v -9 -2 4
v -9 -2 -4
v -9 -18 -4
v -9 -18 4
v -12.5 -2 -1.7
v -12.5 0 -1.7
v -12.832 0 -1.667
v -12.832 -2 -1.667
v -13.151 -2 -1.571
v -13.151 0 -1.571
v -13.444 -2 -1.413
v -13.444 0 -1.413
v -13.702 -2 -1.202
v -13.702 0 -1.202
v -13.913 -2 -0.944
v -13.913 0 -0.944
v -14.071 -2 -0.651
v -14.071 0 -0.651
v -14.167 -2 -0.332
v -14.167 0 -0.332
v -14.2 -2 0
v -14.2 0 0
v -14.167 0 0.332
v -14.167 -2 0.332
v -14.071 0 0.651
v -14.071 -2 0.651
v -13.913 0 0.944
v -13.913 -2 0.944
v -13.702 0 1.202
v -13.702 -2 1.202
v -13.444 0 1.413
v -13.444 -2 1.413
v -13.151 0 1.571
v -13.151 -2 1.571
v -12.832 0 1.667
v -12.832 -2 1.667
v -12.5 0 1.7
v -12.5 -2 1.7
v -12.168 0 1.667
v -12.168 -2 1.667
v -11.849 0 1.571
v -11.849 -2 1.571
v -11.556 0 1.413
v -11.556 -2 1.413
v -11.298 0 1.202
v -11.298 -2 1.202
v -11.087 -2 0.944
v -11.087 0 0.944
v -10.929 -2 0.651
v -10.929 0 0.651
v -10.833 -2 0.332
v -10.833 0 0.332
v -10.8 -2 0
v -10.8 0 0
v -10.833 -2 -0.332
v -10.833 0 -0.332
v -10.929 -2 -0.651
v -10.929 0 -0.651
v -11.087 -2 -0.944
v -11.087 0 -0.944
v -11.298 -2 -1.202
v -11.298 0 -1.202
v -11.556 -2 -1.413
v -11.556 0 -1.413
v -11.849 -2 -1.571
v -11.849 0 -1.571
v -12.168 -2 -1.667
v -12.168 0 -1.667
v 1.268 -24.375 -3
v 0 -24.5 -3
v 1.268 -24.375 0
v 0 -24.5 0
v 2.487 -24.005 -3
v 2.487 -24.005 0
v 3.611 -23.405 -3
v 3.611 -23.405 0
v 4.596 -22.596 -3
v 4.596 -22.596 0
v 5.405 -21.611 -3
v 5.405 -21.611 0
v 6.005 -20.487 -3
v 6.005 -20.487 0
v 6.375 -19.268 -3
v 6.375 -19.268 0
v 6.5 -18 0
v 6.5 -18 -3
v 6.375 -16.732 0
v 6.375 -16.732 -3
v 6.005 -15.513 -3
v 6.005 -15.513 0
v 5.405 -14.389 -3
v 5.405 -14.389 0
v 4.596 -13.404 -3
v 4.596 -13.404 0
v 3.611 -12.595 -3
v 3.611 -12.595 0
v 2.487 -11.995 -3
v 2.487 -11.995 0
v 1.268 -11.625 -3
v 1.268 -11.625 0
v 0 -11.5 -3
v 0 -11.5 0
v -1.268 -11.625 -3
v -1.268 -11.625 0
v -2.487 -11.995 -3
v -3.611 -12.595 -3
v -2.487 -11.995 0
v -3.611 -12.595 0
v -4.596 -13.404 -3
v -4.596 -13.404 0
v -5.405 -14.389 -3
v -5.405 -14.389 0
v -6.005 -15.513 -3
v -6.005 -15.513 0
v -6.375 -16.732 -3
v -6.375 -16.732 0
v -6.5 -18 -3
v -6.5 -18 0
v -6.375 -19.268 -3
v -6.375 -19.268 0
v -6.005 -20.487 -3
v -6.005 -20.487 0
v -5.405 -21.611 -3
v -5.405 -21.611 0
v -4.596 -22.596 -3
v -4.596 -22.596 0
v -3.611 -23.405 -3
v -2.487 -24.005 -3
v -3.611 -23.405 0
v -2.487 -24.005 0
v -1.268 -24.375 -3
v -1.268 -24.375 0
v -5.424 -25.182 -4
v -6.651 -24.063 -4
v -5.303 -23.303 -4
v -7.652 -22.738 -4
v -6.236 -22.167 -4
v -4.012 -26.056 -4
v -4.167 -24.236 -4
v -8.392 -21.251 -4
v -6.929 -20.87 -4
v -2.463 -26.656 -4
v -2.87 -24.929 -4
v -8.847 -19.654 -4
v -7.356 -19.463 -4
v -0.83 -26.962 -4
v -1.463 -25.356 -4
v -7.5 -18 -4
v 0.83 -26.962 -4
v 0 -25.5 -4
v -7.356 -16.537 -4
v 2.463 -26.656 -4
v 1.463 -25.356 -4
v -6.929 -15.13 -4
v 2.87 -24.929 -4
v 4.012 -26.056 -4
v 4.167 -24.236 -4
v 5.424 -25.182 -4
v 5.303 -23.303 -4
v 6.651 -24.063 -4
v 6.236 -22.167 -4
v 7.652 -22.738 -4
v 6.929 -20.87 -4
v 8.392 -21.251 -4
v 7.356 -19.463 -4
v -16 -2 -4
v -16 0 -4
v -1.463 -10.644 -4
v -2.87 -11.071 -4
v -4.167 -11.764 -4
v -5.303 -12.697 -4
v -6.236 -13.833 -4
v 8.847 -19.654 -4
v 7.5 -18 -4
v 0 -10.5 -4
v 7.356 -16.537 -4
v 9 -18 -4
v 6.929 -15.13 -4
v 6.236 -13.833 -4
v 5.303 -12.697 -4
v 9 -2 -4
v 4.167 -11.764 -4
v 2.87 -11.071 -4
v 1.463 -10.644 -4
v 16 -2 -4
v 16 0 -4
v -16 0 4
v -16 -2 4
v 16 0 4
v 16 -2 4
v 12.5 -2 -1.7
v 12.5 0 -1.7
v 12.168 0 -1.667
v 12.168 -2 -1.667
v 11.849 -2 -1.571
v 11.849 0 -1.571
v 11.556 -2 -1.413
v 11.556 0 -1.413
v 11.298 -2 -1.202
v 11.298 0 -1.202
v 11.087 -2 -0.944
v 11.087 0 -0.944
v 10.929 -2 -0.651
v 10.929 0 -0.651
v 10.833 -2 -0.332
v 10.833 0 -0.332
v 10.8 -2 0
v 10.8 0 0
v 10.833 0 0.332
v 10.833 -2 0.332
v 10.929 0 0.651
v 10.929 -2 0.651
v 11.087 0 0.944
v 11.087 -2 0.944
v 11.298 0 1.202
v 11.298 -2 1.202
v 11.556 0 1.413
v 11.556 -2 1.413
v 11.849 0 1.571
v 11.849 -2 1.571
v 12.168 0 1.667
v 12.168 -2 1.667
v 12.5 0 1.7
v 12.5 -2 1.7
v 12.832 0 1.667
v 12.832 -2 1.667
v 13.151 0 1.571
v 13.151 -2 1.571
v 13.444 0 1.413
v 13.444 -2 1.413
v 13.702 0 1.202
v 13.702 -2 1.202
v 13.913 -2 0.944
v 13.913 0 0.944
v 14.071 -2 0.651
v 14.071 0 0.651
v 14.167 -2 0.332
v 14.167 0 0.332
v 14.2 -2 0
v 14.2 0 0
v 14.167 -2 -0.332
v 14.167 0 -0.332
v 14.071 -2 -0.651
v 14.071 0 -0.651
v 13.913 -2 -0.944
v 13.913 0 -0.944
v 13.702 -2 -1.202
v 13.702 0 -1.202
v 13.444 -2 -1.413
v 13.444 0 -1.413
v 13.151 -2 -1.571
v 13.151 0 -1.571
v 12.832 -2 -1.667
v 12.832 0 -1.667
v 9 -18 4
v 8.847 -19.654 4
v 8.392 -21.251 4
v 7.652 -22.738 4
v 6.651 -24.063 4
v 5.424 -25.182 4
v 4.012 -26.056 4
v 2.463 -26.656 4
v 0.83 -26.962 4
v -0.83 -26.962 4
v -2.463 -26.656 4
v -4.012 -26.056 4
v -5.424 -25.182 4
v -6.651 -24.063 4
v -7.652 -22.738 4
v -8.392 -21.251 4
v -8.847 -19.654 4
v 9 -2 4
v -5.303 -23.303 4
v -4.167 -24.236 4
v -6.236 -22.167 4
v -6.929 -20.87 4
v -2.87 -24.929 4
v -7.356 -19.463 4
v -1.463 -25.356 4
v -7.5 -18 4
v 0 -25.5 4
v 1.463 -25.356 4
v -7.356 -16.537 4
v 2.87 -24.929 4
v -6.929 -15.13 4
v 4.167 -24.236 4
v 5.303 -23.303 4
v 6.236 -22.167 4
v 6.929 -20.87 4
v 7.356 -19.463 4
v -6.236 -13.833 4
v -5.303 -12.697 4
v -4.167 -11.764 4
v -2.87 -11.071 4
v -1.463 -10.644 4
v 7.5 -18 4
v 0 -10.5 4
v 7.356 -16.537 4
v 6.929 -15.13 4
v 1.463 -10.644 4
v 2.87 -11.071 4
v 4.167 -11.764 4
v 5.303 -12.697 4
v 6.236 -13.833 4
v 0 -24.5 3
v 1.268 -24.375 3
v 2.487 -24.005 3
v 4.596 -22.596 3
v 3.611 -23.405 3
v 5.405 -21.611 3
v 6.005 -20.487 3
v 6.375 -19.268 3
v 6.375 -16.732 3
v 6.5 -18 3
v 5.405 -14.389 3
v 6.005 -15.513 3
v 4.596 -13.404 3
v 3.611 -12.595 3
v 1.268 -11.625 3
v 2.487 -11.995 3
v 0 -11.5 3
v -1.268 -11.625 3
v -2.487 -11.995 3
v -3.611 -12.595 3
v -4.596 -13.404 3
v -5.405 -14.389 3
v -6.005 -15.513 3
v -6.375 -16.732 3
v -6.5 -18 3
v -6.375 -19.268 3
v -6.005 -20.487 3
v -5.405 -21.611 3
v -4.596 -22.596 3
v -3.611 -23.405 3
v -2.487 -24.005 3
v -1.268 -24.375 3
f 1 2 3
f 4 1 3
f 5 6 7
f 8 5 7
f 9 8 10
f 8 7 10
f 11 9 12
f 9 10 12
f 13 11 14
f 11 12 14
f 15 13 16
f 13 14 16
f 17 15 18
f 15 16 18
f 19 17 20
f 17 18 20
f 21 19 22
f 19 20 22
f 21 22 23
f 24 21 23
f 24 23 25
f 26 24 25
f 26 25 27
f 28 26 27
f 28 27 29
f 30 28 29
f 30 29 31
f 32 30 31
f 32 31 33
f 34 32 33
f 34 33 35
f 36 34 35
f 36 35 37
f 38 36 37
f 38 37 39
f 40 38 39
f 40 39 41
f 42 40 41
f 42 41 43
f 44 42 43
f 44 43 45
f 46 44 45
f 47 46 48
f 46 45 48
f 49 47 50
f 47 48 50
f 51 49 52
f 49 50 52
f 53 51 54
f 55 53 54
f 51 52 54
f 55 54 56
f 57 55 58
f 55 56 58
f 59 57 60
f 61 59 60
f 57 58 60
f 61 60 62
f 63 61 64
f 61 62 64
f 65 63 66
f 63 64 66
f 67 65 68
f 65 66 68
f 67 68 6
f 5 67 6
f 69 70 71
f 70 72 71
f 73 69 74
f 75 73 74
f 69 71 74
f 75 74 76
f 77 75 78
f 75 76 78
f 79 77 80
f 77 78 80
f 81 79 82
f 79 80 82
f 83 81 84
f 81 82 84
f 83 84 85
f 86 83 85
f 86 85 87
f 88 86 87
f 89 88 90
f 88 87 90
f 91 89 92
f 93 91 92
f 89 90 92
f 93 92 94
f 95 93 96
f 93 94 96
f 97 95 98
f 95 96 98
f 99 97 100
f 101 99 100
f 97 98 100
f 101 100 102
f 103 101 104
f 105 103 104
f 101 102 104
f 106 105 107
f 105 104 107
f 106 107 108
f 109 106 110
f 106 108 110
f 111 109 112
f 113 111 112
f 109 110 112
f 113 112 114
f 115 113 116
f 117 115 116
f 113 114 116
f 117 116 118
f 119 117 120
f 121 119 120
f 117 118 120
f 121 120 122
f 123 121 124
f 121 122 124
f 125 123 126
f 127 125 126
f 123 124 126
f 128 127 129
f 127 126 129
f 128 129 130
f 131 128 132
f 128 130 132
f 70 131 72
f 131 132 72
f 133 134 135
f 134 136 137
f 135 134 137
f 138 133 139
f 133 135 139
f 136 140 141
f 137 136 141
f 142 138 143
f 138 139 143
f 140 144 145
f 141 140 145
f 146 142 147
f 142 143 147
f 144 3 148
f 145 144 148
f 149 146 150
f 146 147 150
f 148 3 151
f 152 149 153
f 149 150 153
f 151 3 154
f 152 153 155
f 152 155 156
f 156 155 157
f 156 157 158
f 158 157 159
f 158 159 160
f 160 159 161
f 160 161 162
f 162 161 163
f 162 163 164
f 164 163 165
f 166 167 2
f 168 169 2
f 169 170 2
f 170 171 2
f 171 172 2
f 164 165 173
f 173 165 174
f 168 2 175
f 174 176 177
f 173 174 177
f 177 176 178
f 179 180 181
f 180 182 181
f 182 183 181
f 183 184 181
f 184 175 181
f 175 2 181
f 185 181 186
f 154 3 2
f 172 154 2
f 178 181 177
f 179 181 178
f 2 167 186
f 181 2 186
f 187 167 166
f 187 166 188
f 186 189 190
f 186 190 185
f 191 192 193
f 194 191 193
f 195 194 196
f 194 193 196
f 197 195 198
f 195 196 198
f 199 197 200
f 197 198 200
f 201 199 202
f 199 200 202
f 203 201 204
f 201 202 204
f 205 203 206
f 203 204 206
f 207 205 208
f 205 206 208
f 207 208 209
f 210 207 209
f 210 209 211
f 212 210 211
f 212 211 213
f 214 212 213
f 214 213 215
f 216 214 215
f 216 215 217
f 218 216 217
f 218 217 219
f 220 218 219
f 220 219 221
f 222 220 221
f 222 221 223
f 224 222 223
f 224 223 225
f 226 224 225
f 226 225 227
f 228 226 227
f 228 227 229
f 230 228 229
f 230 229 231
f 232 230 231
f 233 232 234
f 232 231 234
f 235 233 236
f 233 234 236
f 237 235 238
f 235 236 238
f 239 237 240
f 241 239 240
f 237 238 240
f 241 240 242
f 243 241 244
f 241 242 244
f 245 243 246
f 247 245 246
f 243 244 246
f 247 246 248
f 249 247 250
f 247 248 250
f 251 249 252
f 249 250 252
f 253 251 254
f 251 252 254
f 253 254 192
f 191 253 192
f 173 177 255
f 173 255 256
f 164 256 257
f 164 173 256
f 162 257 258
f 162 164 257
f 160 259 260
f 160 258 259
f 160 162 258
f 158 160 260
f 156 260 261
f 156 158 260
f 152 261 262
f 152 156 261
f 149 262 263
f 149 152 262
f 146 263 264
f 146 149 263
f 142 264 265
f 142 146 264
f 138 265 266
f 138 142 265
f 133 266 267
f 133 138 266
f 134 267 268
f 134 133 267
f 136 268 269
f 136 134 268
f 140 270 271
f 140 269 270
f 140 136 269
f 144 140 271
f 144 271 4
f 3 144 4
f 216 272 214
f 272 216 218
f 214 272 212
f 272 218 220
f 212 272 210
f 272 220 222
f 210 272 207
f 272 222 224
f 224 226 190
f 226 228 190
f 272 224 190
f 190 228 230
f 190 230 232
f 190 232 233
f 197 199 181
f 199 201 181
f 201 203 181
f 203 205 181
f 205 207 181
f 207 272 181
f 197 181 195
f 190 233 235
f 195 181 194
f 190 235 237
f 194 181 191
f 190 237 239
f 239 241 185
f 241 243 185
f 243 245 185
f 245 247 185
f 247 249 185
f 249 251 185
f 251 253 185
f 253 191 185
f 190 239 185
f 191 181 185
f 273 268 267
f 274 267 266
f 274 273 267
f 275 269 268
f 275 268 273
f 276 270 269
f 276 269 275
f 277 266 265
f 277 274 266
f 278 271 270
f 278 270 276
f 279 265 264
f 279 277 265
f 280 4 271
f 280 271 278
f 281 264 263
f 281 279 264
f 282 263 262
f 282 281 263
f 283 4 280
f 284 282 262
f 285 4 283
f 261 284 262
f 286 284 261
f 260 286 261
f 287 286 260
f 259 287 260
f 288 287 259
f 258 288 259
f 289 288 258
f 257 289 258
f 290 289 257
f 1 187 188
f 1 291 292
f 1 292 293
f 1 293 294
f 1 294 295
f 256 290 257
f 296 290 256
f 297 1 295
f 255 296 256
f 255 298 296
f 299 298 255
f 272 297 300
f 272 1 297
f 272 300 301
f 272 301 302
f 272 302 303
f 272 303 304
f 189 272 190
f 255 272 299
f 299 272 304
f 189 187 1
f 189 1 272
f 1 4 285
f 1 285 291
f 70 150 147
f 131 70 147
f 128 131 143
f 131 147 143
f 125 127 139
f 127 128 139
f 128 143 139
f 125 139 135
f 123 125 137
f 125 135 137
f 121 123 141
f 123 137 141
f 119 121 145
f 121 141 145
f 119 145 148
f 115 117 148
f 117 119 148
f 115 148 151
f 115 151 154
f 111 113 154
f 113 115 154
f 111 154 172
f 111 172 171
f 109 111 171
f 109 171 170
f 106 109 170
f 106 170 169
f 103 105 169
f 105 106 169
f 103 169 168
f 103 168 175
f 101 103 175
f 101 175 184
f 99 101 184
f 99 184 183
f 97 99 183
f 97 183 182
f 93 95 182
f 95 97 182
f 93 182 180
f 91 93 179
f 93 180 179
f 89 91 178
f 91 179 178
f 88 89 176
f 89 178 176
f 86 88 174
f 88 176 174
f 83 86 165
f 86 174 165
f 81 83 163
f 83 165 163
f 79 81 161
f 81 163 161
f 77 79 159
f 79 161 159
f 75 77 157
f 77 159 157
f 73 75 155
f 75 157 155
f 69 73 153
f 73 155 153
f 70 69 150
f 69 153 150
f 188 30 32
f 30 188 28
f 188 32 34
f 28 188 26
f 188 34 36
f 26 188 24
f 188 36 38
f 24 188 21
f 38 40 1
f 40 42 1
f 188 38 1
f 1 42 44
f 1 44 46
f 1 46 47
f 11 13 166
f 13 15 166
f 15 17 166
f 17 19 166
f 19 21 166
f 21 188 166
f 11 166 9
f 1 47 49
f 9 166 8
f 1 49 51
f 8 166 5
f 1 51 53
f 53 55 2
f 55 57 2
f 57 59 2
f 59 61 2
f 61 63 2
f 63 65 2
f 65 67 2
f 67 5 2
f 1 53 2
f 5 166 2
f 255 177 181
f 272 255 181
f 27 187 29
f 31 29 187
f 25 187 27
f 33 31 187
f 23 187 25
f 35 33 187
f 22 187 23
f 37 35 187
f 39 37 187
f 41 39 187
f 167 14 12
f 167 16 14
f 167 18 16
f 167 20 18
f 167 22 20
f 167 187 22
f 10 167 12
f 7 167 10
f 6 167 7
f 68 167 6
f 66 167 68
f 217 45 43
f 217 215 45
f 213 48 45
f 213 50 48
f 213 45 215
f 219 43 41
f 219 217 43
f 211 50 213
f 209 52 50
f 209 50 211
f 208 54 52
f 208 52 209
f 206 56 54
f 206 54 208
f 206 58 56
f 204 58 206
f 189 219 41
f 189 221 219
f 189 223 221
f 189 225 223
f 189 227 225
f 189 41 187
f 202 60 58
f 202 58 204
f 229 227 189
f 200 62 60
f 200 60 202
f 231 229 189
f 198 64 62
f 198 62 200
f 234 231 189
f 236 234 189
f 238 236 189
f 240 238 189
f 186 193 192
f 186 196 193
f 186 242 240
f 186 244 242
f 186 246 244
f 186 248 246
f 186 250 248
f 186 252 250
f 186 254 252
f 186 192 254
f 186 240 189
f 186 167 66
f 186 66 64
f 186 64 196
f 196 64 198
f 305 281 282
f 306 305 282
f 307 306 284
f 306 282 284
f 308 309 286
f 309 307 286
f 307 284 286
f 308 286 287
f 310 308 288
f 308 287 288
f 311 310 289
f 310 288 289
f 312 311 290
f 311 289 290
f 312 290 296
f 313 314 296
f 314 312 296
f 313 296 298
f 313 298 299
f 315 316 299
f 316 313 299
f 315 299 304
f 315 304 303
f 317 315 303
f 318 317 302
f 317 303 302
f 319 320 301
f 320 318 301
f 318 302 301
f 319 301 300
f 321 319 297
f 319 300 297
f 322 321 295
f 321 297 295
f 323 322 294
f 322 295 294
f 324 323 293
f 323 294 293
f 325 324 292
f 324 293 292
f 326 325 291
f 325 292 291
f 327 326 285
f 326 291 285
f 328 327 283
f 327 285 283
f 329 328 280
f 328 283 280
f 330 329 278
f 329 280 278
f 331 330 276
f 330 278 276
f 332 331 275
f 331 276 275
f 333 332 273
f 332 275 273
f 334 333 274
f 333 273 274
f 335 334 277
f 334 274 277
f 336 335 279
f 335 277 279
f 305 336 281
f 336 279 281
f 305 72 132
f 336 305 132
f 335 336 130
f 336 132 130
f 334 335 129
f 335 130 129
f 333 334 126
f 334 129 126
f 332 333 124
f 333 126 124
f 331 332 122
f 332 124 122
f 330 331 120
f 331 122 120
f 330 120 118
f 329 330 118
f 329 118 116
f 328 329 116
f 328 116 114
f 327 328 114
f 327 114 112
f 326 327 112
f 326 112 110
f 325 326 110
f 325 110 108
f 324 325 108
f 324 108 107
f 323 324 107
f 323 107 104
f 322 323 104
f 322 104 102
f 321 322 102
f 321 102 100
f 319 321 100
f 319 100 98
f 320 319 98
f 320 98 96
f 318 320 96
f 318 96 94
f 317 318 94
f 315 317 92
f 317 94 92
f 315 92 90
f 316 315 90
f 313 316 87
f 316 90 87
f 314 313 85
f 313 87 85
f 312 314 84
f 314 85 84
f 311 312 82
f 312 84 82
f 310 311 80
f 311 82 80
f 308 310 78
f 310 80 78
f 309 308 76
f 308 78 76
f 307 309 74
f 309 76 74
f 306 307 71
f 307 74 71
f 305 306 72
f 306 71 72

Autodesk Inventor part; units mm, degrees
ref_plane "YZ Plane" through (0, 0, 0) normal (1, 0, 0) x (0, 1, 0)
ref_plane "XZ Plane" through (0, 0, 0) normal (0, 1, 0) x (-1, 0, 0)
ref_plane "XY Plane" through (0, 0, 0) normal (0, 0, 1) x (1, 0, 0)
sketch "Sketch2" plane through (0, 0, 0) normal (0, 0, 1) x (1, 0, 0)
  line L0 (0, 0) -> (0, -18) construction
  line L1 (-9, 0) -> (-9, -18)
  line L2 (9, -18) -> (9, 0)
  arc A0 (9, 0) -> (-9, 0) centre (0, 0) ccw construction
  arc A1 (-9, -18) -> (9, -18) centre (0, -18) ccw
  arc A2 (6.5, -18) -> (-6.5, -18) centre (0, -18) ccw
  circle A3 centre (0, -18) radius 5 construction
  line L3 (-9, 0) -> (9, 0)
  line L4 (9, -18) -> (6.5, -18)
  arc A4 (-6.5, -18) -> (0, -24.5) centre (0, -18) ccw
  arc A5 (0, -24.5) -> (6.5, -18) centre (0, -18) ccw
  line L5 (-6.5, -18) -> (-9, -18)
  line L6 (6.5, -18) -> (-6.5, -18) construction
  line L7 (9, -18) -> (6.5, -18)
  line L8 (-9, -18) -> (-6.5, -18)
  point P0 (0, -9)
  dimension "d2" = 2.5
  dimension "d3" = 10
  dimension "d4" = 1.5
  dimension "d5" = 18
extrude "Extrusion1" add sketch "Sketch2" along normal mid plane 8 contours L3 L2 L4 A2 L5 L1 | L5 A4 A5 L4 A1
sketch "Sketch3" plane through (-9, 0, 4) normal (0, 1, 0) x (1, 0, 0)
  line L0 (-7, 0) -> (25, 0)
  line L1 (25, 0) -> (25, 8)
  line L2 (25, 8) -> (-7, 8)
  line L3 (-7, 8) -> (-7, 0)
  line L4 (-7, 0) -> (25, 8) construction
  line L5 (25, 0) -> (-7, 8) construction
  line L6 (0, 8) -> (18, 8) projected
  line L7 (0, 8) -> (0, 0) projected
  point P0 (9, 4)
  dimension "d8" = 7
extrude "Extrusion2" add sketch "Sketch3" against normal blind 2
sketch "Sketch4" plane through (-9, -2, 4) normal (0, -1, 0) x (1, 0, 0)
  line L0 (18, -8) -> (0, -8) construction
  line L1 (-7, 0) -> (0, 0) construction
  line L2 (-7, -8) -> (-7, 0) construction
  line L3 (0, 0) -> (18, 0) construction
  line L4 (25, 0) -> (25, -8) construction
  line L5 (25, -8) -> (18, -8) construction
  line L6 (0, -8) -> (0, 0) construction
  line L7 (0, -8) -> (-7, -8) construction
  line L8 (18, 0) -> (25, 0) construction
  line L9 (18, 0) -> (18, -8) construction
  line L10 (0, 0) -> (0, -8) projected
  line L11 (0, 0) -> (-7, 0) projected
  line L12 (-7, 0) -> (-7, -8) projected
  line L13 (-7, -8) -> (0, -8) projected
  line L14 (18, -8) -> (18, 0) projected
  line L15 (18, -8) -> (25, -8) projected
  line L16 (25, -8) -> (25, 0) projected
  line L17 (25, 0) -> (18, 0) projected
  point P0 (-3.5, -4)
  point P1 (21.5, -4)
  point P2 (21.5, 0)
  point P3 (-3.5, 0)
  point P4 (25, -4)
  point P5 (25, -4)
hole "Hole1" at (-12.5, -2, 0) at (12.5, -2, 0) direction (0, 1, 0) diameter 3.4 end through all
chamfer "Chamfer2" distance 1 angle 45 2 edges at (0, -11.5, -4) (0, -11.5, 4)
properties part number "driver gear stopper"
